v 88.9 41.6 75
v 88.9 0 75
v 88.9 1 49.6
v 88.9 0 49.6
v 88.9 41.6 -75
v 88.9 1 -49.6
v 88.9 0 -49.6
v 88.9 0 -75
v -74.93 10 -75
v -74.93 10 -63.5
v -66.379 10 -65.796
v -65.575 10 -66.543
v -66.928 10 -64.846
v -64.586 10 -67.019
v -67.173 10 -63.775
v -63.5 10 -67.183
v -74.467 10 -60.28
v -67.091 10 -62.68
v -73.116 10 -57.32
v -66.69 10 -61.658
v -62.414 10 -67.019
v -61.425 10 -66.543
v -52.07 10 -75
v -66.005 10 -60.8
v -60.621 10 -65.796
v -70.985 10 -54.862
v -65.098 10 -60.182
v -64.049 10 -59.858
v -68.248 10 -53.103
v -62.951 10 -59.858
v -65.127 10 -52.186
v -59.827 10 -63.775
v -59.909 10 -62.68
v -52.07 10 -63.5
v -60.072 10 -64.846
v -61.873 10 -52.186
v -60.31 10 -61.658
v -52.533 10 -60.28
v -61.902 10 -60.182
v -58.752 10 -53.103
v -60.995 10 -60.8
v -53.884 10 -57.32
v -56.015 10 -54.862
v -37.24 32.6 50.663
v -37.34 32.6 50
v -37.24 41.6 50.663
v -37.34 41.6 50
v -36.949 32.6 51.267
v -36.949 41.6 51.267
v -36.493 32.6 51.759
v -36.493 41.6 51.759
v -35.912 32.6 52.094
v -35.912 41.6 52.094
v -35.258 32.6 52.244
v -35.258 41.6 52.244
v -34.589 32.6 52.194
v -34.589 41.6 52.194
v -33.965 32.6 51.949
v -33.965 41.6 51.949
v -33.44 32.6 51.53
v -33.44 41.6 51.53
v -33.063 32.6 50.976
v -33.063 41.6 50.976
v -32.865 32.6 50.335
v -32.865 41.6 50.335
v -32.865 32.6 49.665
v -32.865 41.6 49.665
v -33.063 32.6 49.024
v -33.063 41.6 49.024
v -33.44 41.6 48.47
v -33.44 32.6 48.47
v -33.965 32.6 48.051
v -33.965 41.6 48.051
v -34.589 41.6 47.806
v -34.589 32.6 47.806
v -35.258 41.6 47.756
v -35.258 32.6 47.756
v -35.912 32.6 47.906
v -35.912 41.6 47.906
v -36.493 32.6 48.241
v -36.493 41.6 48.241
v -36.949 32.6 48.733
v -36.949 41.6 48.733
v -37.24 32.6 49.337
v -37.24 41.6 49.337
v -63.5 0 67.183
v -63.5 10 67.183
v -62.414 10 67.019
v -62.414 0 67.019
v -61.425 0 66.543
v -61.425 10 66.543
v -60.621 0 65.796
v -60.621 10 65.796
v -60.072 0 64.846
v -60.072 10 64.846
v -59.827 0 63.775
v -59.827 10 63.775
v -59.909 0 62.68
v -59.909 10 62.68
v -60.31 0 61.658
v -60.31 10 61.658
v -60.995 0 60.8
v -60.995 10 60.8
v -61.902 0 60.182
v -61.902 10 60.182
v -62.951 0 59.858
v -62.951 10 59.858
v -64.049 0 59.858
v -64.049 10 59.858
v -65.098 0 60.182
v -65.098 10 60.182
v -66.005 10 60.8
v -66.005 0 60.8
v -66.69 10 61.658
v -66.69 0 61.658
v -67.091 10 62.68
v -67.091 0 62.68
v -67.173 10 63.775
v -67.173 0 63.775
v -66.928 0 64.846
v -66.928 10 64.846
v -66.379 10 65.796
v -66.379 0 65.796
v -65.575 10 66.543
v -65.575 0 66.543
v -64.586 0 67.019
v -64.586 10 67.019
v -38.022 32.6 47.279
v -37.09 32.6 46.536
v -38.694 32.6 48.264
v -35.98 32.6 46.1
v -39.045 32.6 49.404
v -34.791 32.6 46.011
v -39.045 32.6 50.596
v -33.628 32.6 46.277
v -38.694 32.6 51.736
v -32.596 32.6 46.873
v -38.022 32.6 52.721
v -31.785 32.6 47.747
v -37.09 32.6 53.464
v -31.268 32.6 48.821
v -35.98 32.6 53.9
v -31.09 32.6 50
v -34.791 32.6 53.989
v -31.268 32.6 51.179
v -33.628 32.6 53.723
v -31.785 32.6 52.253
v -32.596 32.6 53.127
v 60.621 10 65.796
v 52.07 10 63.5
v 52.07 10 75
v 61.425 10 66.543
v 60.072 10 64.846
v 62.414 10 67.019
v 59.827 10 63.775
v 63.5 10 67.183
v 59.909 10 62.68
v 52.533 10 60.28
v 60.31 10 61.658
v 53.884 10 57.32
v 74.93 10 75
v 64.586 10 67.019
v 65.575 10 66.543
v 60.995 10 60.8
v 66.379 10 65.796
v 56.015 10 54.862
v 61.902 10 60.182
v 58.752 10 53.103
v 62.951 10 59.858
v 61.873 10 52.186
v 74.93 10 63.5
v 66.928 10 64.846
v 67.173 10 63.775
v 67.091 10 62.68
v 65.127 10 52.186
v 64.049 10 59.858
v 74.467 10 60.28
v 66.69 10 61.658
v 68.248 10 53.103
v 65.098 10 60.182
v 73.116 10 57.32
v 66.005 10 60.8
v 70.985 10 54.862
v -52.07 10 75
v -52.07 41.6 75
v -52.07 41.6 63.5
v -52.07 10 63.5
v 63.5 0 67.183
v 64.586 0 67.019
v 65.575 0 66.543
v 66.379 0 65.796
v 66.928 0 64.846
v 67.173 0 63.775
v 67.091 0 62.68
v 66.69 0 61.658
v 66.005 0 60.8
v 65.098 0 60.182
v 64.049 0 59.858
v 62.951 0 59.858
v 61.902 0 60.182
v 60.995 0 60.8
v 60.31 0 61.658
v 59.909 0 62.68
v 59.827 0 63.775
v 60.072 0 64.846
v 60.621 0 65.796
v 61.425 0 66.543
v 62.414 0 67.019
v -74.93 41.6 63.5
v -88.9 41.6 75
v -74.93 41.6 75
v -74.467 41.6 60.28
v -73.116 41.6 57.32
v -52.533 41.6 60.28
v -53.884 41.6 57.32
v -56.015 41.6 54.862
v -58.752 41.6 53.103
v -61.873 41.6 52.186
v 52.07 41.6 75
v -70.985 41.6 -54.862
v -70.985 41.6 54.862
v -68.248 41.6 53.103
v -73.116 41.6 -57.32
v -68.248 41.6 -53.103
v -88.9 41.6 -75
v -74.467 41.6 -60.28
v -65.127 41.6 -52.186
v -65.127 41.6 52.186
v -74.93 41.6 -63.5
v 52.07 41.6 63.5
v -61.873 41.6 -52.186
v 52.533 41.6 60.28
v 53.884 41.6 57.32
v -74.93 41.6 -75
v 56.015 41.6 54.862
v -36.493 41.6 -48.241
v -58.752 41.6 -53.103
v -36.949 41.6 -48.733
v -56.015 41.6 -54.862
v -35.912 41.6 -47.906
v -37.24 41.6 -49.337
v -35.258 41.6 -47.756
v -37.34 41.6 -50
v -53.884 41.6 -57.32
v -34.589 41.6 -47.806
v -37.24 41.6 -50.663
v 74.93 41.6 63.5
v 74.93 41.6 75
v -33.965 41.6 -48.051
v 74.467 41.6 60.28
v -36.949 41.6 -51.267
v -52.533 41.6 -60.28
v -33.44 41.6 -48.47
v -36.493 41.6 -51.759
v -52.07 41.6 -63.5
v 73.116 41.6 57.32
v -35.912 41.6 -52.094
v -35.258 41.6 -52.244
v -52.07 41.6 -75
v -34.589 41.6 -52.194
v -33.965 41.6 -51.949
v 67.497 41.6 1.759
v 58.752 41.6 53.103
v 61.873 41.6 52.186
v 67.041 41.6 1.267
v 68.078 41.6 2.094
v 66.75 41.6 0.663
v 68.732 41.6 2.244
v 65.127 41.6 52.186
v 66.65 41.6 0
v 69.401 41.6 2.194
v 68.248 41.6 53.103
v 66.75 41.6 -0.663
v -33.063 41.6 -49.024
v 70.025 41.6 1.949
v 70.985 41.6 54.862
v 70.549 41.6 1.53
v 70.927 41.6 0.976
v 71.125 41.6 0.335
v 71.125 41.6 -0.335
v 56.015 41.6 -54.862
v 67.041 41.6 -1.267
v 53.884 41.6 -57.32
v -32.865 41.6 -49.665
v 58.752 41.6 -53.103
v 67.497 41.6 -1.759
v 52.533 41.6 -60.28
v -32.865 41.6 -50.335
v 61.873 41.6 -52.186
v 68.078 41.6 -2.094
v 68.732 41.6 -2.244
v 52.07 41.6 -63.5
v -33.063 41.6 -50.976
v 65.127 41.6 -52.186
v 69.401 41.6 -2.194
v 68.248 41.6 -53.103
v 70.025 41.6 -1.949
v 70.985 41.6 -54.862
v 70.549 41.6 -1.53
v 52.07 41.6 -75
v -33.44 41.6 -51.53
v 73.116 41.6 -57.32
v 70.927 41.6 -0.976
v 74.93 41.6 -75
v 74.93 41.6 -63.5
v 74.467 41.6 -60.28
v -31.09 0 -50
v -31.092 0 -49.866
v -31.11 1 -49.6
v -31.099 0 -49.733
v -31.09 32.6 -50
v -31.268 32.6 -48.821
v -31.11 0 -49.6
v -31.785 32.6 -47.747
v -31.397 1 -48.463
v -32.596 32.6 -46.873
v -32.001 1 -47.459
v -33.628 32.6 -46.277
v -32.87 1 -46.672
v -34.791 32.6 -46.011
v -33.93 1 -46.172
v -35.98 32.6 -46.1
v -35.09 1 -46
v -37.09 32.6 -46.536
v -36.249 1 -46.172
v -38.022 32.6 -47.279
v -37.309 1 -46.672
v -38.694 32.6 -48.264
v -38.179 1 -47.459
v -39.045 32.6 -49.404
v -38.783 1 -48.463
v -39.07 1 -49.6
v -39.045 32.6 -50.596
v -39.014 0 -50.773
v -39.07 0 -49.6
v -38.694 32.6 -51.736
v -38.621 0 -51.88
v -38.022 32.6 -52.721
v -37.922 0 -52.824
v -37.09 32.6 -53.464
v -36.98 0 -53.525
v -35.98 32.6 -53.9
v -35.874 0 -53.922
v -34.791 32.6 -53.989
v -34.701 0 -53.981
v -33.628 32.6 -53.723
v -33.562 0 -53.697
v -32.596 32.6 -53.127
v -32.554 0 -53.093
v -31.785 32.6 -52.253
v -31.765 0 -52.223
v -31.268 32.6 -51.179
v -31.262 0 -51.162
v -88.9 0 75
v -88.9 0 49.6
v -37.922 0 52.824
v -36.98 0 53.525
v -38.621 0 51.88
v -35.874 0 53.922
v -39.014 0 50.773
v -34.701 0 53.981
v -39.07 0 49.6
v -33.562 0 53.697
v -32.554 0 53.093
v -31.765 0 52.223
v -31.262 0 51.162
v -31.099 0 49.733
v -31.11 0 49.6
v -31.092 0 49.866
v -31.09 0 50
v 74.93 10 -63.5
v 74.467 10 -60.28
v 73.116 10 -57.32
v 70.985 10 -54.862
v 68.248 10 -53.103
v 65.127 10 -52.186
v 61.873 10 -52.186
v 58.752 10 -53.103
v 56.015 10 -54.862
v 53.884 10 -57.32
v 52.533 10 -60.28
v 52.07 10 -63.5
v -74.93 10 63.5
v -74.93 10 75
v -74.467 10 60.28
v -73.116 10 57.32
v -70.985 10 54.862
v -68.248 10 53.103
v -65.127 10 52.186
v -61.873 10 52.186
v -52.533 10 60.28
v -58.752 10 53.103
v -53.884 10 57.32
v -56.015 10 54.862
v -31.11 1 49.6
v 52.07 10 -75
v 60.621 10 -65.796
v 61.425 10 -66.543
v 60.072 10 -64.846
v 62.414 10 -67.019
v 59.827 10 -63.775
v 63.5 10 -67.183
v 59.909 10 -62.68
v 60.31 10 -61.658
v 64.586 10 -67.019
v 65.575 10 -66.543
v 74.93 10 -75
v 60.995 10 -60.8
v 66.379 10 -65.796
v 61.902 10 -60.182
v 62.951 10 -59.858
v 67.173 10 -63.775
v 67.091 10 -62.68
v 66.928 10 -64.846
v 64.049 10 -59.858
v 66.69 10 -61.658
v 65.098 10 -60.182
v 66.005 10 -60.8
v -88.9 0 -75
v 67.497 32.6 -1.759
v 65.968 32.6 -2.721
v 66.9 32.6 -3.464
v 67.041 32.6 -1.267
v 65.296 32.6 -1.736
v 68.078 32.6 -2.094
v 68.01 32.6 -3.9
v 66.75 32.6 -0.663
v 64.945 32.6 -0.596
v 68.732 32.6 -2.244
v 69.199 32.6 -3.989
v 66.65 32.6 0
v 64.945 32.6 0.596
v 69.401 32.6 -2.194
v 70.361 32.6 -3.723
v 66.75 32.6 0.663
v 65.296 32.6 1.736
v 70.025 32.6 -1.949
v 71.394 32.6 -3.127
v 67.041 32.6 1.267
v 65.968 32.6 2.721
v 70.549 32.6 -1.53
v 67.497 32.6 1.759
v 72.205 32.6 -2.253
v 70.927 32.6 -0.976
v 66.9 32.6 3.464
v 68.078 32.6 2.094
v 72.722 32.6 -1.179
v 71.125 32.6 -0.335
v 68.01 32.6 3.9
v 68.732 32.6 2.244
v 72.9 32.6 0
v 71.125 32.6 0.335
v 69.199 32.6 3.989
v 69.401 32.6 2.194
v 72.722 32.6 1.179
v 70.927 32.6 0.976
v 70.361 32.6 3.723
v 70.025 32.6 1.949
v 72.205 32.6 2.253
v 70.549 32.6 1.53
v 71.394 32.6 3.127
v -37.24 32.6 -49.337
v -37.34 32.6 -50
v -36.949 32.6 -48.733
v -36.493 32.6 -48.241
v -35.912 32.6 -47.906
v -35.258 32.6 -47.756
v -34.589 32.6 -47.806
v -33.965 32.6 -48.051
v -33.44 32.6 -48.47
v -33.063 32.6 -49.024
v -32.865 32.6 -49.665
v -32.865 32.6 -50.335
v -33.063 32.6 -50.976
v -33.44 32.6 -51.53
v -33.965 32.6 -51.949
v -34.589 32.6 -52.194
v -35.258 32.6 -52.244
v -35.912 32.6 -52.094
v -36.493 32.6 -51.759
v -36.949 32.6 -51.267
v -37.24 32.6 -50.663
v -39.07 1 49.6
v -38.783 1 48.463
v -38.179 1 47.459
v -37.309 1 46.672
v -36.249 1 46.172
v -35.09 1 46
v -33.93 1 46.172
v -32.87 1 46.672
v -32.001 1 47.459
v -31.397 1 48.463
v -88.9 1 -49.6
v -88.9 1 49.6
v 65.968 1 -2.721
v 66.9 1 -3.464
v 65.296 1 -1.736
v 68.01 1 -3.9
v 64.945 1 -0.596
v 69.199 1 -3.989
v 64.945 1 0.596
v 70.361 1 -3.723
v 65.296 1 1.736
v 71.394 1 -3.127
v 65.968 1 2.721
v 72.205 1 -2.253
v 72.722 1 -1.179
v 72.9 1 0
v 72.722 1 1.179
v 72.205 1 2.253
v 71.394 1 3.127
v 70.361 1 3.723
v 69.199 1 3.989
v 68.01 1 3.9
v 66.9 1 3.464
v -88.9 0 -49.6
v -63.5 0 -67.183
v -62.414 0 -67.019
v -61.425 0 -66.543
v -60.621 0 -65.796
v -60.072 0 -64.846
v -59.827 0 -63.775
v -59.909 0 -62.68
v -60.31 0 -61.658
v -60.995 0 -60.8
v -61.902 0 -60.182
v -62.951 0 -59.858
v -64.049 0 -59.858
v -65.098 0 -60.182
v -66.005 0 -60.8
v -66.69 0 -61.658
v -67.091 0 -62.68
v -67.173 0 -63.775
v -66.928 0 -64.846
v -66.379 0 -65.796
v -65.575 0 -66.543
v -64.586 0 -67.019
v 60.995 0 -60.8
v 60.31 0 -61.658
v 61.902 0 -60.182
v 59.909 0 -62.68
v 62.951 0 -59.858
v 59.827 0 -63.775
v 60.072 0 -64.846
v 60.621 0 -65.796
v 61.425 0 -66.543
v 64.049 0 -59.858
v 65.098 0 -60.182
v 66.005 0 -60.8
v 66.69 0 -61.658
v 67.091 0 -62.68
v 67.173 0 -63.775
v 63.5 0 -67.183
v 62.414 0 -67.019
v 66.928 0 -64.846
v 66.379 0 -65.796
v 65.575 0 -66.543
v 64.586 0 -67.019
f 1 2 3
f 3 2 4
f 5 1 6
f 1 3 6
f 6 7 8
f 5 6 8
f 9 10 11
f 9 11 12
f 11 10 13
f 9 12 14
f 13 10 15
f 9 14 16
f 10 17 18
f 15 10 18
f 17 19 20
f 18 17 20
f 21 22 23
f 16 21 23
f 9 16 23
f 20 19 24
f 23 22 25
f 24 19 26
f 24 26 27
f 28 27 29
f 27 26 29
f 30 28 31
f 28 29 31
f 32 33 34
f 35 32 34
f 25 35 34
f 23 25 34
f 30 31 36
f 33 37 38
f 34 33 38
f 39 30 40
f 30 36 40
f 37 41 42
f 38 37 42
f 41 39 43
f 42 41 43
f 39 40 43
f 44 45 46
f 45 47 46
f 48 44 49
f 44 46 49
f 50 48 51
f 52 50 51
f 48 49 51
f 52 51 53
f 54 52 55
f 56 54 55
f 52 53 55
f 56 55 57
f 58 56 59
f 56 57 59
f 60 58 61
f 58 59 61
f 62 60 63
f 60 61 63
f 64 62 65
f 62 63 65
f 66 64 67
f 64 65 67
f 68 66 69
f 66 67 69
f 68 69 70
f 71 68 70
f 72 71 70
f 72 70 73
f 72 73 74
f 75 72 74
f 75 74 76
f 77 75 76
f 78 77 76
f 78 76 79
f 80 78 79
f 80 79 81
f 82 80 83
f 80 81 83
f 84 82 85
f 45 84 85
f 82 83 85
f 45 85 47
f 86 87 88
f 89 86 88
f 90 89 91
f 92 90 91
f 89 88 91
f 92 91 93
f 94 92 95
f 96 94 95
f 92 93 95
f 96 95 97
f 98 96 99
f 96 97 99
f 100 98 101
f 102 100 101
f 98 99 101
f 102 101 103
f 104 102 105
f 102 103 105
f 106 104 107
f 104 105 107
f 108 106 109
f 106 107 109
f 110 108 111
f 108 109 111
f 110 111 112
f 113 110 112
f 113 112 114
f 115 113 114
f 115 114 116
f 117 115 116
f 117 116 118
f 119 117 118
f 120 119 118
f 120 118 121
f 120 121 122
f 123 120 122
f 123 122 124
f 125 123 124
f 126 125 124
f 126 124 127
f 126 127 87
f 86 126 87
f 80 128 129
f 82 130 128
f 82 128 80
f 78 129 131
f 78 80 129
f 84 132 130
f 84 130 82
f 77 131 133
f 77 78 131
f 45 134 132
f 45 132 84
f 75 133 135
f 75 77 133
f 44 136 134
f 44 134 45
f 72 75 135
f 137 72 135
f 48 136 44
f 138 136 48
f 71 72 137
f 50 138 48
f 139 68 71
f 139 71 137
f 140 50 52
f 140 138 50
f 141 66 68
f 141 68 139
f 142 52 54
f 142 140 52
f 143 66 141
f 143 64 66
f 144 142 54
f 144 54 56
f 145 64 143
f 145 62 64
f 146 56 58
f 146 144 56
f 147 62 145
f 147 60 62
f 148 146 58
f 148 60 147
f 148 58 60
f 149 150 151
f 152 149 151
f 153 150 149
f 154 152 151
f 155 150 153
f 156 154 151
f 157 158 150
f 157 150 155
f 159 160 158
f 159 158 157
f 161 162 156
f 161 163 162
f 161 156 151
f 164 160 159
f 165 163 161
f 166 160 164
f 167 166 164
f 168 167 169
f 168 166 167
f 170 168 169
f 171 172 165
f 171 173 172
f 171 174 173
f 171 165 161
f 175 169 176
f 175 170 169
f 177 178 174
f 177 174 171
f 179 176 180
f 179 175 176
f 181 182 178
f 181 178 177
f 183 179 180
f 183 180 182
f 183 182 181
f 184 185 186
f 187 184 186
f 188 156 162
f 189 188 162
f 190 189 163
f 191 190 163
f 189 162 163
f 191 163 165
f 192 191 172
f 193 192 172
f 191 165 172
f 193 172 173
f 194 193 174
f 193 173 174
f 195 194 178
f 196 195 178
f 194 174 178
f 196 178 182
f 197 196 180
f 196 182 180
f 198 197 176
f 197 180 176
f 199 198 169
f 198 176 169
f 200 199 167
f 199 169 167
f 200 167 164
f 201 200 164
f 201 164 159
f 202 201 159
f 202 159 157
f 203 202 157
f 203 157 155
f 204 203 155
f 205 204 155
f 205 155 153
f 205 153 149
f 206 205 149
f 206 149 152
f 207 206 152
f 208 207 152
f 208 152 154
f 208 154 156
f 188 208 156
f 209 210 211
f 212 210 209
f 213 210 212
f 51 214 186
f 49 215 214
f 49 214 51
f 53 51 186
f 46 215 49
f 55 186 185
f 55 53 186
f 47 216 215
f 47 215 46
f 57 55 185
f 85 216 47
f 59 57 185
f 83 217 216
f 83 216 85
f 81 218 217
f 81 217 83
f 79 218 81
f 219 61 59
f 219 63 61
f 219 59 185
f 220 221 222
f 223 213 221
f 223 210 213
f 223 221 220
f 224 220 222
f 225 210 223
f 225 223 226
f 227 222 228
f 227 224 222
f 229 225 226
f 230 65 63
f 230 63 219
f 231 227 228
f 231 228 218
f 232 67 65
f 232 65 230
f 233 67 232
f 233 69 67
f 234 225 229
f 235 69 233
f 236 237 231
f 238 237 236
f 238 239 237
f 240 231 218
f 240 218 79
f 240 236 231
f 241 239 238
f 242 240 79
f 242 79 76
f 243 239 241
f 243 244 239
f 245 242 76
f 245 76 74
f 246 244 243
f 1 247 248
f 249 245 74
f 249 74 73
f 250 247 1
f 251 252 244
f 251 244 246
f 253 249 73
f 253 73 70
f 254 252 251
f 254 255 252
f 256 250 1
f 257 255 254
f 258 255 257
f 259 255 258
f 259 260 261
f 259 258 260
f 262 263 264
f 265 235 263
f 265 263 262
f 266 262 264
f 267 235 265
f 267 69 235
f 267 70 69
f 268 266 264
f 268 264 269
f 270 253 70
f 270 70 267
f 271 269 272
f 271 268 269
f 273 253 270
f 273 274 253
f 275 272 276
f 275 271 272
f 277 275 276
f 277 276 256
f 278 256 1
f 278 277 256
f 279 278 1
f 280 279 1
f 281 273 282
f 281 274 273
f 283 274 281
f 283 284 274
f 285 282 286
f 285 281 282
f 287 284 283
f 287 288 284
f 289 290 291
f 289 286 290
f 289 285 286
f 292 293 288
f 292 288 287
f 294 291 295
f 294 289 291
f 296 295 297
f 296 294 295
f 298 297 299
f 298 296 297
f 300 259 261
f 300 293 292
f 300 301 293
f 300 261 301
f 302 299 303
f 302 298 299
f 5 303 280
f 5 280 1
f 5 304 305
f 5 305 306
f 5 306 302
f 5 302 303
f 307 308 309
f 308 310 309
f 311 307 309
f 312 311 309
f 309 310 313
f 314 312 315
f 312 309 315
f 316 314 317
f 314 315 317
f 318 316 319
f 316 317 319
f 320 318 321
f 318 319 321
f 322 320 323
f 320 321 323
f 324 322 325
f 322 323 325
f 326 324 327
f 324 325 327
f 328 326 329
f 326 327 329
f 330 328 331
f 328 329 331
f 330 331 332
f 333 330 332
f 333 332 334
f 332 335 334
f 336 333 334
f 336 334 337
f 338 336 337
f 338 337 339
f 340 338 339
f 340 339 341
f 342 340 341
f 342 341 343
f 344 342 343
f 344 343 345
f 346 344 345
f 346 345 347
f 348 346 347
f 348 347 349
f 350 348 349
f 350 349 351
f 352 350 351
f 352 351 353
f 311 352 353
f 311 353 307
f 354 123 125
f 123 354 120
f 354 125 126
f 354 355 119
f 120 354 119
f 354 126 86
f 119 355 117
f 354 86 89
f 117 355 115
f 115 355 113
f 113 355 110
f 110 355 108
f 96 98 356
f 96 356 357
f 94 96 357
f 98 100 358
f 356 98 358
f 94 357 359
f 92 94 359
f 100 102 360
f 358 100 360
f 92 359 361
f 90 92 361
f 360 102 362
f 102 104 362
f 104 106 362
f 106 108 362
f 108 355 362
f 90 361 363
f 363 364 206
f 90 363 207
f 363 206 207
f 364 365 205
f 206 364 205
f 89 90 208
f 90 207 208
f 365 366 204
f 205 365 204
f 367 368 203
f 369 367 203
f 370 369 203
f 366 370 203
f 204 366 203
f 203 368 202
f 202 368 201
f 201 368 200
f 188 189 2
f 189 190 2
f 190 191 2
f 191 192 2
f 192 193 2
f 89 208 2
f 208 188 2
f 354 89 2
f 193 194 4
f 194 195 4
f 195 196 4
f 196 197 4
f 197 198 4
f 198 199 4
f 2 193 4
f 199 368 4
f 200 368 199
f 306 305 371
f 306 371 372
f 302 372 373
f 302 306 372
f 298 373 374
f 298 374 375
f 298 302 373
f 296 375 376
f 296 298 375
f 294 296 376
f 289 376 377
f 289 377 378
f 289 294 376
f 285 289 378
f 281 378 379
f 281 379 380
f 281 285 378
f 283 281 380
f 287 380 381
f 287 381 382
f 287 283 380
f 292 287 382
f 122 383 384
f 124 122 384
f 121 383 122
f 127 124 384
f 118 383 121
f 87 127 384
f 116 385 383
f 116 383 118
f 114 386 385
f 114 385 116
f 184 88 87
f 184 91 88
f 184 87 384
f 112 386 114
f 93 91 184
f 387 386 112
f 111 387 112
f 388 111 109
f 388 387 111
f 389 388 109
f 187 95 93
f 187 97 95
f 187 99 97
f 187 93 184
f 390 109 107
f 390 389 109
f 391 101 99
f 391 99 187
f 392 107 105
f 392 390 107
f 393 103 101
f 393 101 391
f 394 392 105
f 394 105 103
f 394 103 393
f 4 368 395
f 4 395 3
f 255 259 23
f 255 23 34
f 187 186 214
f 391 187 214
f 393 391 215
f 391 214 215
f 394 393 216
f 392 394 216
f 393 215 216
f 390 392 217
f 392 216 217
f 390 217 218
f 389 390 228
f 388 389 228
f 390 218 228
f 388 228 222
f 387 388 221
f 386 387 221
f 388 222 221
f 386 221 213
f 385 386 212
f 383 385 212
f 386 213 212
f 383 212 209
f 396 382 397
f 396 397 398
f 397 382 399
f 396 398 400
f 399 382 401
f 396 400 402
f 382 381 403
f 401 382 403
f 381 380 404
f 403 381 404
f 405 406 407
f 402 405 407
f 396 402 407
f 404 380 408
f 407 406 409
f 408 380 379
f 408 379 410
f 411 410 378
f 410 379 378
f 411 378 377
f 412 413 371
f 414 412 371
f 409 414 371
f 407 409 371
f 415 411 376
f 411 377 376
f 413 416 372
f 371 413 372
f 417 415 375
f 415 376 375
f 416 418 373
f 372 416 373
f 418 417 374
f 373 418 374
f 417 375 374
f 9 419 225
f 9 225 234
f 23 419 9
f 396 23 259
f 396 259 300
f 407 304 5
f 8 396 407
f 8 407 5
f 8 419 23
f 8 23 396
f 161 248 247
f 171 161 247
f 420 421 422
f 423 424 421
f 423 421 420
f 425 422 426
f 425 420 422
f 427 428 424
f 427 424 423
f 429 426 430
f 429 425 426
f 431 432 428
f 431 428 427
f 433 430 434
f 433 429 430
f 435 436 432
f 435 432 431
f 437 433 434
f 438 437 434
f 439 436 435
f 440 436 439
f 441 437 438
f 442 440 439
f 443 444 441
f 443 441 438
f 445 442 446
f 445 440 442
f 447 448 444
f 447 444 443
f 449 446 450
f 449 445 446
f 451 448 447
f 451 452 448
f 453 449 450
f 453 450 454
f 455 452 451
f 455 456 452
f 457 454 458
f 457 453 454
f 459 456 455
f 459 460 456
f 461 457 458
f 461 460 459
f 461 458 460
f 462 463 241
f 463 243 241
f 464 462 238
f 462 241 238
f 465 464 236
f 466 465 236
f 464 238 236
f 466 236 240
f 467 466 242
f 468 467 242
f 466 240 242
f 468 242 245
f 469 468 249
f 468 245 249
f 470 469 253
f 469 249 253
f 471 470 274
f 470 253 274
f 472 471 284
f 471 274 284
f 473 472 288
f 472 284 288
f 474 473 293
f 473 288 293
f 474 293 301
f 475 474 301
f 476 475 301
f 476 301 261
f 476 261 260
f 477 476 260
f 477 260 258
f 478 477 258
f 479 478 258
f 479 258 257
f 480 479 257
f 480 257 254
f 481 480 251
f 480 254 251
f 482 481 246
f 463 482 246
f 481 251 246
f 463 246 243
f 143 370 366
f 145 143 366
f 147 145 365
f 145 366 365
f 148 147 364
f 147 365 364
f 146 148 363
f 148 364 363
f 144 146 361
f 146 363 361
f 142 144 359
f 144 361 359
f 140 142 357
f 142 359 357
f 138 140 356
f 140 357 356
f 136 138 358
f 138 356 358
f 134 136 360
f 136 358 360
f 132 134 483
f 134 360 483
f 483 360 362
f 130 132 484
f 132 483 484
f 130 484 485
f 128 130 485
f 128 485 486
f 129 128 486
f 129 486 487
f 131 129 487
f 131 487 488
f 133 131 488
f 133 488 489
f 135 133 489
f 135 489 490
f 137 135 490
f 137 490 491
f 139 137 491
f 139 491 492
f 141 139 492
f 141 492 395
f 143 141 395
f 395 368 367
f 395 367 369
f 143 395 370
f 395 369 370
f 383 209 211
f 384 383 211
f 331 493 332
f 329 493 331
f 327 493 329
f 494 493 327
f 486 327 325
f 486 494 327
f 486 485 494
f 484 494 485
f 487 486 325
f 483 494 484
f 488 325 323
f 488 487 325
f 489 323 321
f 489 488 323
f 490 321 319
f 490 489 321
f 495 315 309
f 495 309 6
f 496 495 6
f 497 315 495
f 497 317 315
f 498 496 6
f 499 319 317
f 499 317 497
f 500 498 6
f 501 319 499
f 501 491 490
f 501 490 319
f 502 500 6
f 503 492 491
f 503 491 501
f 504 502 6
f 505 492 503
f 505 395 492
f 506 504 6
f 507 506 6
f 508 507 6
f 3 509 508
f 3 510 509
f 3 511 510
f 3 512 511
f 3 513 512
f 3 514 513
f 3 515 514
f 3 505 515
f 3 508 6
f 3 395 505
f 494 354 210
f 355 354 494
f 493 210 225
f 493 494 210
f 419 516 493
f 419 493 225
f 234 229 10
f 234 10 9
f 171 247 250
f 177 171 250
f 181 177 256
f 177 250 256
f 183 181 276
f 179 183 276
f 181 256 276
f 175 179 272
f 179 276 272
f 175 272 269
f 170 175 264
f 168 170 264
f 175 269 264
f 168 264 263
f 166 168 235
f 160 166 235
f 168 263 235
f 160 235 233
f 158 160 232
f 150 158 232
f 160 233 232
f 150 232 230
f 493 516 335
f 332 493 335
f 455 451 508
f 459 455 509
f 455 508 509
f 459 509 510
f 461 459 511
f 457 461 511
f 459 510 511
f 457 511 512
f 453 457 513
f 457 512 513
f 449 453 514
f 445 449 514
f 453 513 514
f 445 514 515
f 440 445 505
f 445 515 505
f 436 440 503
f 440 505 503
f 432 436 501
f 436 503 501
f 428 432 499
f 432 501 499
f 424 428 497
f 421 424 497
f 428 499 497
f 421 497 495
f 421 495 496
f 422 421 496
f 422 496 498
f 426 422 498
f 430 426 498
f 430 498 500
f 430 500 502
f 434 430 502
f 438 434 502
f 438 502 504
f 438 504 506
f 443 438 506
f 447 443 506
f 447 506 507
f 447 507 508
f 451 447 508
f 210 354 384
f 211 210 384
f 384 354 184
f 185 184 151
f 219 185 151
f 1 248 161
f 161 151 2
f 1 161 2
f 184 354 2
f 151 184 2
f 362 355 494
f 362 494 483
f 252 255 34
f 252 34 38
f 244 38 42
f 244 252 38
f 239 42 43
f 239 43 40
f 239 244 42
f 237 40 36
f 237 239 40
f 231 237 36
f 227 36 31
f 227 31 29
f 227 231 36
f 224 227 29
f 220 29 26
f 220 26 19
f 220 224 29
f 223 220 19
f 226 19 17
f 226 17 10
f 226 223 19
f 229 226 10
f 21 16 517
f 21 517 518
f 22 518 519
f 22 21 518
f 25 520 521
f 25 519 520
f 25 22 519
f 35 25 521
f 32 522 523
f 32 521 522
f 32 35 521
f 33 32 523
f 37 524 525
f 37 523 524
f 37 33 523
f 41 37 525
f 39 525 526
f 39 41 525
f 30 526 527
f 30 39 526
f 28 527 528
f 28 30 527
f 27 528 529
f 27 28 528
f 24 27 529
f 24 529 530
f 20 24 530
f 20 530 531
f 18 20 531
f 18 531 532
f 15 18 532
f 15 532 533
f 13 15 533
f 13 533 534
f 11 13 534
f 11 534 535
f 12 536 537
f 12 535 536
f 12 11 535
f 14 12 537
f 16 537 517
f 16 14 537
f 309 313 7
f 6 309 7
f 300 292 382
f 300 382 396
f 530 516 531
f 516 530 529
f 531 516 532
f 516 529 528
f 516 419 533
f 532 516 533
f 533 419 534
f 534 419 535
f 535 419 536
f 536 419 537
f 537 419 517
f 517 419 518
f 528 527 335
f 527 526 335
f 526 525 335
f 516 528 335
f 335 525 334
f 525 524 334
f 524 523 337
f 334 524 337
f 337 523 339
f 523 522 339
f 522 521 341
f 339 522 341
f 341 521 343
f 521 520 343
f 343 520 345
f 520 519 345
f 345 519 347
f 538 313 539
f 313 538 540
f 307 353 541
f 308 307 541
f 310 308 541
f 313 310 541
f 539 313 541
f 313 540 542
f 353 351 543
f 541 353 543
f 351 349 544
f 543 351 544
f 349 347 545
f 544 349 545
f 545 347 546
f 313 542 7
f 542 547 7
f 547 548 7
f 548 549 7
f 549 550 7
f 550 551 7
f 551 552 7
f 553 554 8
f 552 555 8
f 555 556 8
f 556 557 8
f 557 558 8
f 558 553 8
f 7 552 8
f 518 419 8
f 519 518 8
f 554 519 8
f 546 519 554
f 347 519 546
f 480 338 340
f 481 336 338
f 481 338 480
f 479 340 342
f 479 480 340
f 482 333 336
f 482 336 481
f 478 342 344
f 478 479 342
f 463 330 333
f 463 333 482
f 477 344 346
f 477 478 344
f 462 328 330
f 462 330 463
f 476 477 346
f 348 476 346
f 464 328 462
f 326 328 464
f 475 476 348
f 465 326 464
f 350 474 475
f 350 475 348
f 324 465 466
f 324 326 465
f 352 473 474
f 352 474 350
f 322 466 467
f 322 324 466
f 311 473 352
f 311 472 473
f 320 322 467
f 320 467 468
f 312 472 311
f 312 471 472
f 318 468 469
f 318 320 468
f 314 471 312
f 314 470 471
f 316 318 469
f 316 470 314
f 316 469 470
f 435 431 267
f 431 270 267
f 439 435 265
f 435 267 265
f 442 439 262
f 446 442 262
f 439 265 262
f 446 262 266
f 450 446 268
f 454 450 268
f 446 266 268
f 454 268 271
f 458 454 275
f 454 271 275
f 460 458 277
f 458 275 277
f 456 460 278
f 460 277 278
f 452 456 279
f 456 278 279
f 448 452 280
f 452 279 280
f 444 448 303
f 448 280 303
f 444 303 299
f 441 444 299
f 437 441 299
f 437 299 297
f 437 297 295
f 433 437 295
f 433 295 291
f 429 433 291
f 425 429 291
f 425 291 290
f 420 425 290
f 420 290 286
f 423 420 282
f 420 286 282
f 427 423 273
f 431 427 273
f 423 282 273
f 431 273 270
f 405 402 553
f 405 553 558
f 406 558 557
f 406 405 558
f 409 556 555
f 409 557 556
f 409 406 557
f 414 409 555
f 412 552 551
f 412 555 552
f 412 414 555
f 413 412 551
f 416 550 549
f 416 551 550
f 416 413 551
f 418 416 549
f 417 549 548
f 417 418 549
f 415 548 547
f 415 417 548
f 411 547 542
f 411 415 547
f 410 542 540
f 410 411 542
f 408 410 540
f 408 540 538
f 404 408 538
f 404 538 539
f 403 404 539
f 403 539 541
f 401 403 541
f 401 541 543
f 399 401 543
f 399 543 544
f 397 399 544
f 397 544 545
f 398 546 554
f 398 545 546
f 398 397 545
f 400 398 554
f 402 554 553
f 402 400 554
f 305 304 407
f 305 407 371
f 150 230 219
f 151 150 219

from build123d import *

# Parameters (mm, degrees)
SKETCH1_W                                           = 177.8
SKETCH1_H                                           = 150
BOSS_EXTRUDE1_DEPTH                                 = 41.6
SKETCH2_R                                           = 3.683
CUT_EXTRUDE1_DEPTH                                  = 42.6
CUT_EXTRUDE2_DEPTH                                  = 31.6
CBORE_FOR_M4_HEX_SOCKET_HEAD_CAP_SCREW1_D           = 4.5
CBORE_FOR_M4_HEX_SOCKET_HEAD_CAP_SCREW1_CBORE_D     = 8
CBORE_FOR_M4_HEX_SOCKET_HEAD_CAP_SCREW1_CBORE_DEPTH = 32.6
SKETCH9_W                                           = 177.8
SKETCH9_H                                           = 99.2
CUT_EXTRUDE4_DEPTH                                  = 1


with BuildPart() as part:
    # Sketch1 → Boss-Extrude1 (new body)
    with BuildSketch(Plane(origin=(0, 0, 0), x_dir=(1, 0, 0), z_dir=(0, 1, 0))):
        Rectangle(SKETCH1_W, SKETCH1_H)
    extrude(amount=BOSS_EXTRUDE1_DEPTH)

    # Sketch2 → Cut-Extrude1 (cut, through all)
    with BuildSketch(Plane(origin=(0, 41.6, 0), x_dir=(1, 0, 0), z_dir=(0, 1, 0))):
        with Locations(Location((63.5, -63.5, 0), (0, 0, 270))):  # turned: the seam where the file's is
            Circle(SKETCH2_R)
        with Locations(Location((-63.5, -63.5, 0), (0, 0, 270))):  # turned: the seam where the file's is
            Circle(SKETCH2_R)
    cut_extrude1 = extrude(amount=-CUT_EXTRUDE1_DEPTH, mode=Mode.SUBTRACT)

    # Sketch3 → Cut-Extrude2 (cut)
    with BuildSketch(Plane(origin=(0, 41.6, 0), x_dir=(1, 0, 0), z_dir=(0, 1, 0))):
        with BuildLine():
            Line((-74.93, -63.5), (-74.93, -75))
            Line((-74.93, -75), (-52.07, -75))
            Line((-52.07, -75), (-52.07, -63.5))
            ThreePointArc((-52.07, -63.5), (-63.5, -52.07), (-74.93, -63.5))
        make_face()
        with BuildLine():
            Line((52.07, -63.5), (52.07, -75))
            Line((52.07, -75), (74.93, -75))
            Line((74.93, -75), (74.93, -63.5))
            ThreePointArc((74.93, -63.5), (63.5, -52.07), (52.07, -63.5))
        make_face()
    cut_extrude2 = extrude(amount=-CUT_EXTRUDE2_DEPTH, mode=Mode.SUBTRACT)

    # Mirror1: Cut-Extrude1, Cut-Extrude2 across plane
    add(cut_extrude1.mirror(Plane(origin=(0, 0, 0), x_dir=(1, 0, 0), z_dir=(0, 0, -1))), mode=Mode.SUBTRACT)
    add(cut_extrude2.mirror(Plane(origin=(0, 0, 0), x_dir=(1, 0, 0), z_dir=(0, 0, -1))), mode=Mode.SUBTRACT)

    # CBORE for M4 Hex Socket Head Cap Screw1 (through all)
    with Locations(Plane.XZ):
        with Locations((68.9, 0), (-35.089800026, 50), (-35.089800026, -50)):
            CounterBoreHole(CBORE_FOR_M4_HEX_SOCKET_HEAD_CAP_SCREW1_D / 2, CBORE_FOR_M4_HEX_SOCKET_HEAD_CAP_SCREW1_CBORE_D / 2, CBORE_FOR_M4_HEX_SOCKET_HEAD_CAP_SCREW1_CBORE_DEPTH)

    # Sketch9 → Cut-Extrude4 (cut)
    with BuildSketch(Plane.XZ):
        Rectangle(SKETCH9_W, SKETCH9_H)
    extrude(amount=-CUT_EXTRUDE4_DEPTH, mode=Mode.SUBTRACT)


solid = part.part
